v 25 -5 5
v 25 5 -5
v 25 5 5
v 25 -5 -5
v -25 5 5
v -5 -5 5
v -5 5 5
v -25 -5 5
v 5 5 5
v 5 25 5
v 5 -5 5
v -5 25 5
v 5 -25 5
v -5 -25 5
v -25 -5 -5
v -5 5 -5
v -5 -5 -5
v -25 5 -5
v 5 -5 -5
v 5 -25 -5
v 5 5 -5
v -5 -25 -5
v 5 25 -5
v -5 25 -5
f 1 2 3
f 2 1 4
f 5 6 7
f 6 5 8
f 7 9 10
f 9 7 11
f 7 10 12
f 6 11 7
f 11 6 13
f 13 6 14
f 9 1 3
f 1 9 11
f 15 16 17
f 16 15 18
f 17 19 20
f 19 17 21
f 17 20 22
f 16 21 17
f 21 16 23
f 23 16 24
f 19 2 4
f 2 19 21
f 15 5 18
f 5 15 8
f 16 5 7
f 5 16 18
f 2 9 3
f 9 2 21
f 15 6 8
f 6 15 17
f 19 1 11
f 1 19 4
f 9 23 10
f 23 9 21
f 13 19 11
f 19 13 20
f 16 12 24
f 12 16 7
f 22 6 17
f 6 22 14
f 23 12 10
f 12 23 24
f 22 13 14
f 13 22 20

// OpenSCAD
union() {
cube([50,10,10], center=true);
cube([10,50,10], center=true);
}
